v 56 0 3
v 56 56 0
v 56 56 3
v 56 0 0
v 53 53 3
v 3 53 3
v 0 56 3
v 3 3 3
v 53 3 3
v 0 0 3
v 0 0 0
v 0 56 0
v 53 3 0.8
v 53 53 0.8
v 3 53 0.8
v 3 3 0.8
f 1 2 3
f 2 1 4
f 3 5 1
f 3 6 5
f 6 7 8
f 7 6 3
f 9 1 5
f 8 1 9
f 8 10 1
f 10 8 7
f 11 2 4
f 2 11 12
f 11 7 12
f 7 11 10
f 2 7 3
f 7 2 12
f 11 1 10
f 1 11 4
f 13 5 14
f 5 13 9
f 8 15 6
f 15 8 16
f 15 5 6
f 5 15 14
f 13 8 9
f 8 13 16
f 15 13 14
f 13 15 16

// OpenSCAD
module lithophane()
{
    //  somewhat rough OpenSCAD lithophane - scruss, 2019-10
     infile  = "phone.png";    // input image, PNG greyscale best
     x_px    = 262;  // input image width,  pixels
     y_px    = 255;  // input image height, pixels
     z_min   = 0.8;  // minimum output thickness, mm
     z_max   = 3;    // maximum output thickness, mm
     y_size  = 50;   // output image height, mm
     // don't need to modify anything below here
     translate([0, 0, z_max])scale([y_size / y_px, y_size / y_px, (z_max - z_min)/100])surface(file = infile, invert = true);
     cube([x_px * y_size / y_px, y_size, z_min]);
}


union()
{
    translate([3, 3, 0]) lithophane();
    difference()
    {
        cube([50+6, 50+6, 3]);
        translate([3,3,-0.5]) cube([50, 50, 4]);
    }
}
